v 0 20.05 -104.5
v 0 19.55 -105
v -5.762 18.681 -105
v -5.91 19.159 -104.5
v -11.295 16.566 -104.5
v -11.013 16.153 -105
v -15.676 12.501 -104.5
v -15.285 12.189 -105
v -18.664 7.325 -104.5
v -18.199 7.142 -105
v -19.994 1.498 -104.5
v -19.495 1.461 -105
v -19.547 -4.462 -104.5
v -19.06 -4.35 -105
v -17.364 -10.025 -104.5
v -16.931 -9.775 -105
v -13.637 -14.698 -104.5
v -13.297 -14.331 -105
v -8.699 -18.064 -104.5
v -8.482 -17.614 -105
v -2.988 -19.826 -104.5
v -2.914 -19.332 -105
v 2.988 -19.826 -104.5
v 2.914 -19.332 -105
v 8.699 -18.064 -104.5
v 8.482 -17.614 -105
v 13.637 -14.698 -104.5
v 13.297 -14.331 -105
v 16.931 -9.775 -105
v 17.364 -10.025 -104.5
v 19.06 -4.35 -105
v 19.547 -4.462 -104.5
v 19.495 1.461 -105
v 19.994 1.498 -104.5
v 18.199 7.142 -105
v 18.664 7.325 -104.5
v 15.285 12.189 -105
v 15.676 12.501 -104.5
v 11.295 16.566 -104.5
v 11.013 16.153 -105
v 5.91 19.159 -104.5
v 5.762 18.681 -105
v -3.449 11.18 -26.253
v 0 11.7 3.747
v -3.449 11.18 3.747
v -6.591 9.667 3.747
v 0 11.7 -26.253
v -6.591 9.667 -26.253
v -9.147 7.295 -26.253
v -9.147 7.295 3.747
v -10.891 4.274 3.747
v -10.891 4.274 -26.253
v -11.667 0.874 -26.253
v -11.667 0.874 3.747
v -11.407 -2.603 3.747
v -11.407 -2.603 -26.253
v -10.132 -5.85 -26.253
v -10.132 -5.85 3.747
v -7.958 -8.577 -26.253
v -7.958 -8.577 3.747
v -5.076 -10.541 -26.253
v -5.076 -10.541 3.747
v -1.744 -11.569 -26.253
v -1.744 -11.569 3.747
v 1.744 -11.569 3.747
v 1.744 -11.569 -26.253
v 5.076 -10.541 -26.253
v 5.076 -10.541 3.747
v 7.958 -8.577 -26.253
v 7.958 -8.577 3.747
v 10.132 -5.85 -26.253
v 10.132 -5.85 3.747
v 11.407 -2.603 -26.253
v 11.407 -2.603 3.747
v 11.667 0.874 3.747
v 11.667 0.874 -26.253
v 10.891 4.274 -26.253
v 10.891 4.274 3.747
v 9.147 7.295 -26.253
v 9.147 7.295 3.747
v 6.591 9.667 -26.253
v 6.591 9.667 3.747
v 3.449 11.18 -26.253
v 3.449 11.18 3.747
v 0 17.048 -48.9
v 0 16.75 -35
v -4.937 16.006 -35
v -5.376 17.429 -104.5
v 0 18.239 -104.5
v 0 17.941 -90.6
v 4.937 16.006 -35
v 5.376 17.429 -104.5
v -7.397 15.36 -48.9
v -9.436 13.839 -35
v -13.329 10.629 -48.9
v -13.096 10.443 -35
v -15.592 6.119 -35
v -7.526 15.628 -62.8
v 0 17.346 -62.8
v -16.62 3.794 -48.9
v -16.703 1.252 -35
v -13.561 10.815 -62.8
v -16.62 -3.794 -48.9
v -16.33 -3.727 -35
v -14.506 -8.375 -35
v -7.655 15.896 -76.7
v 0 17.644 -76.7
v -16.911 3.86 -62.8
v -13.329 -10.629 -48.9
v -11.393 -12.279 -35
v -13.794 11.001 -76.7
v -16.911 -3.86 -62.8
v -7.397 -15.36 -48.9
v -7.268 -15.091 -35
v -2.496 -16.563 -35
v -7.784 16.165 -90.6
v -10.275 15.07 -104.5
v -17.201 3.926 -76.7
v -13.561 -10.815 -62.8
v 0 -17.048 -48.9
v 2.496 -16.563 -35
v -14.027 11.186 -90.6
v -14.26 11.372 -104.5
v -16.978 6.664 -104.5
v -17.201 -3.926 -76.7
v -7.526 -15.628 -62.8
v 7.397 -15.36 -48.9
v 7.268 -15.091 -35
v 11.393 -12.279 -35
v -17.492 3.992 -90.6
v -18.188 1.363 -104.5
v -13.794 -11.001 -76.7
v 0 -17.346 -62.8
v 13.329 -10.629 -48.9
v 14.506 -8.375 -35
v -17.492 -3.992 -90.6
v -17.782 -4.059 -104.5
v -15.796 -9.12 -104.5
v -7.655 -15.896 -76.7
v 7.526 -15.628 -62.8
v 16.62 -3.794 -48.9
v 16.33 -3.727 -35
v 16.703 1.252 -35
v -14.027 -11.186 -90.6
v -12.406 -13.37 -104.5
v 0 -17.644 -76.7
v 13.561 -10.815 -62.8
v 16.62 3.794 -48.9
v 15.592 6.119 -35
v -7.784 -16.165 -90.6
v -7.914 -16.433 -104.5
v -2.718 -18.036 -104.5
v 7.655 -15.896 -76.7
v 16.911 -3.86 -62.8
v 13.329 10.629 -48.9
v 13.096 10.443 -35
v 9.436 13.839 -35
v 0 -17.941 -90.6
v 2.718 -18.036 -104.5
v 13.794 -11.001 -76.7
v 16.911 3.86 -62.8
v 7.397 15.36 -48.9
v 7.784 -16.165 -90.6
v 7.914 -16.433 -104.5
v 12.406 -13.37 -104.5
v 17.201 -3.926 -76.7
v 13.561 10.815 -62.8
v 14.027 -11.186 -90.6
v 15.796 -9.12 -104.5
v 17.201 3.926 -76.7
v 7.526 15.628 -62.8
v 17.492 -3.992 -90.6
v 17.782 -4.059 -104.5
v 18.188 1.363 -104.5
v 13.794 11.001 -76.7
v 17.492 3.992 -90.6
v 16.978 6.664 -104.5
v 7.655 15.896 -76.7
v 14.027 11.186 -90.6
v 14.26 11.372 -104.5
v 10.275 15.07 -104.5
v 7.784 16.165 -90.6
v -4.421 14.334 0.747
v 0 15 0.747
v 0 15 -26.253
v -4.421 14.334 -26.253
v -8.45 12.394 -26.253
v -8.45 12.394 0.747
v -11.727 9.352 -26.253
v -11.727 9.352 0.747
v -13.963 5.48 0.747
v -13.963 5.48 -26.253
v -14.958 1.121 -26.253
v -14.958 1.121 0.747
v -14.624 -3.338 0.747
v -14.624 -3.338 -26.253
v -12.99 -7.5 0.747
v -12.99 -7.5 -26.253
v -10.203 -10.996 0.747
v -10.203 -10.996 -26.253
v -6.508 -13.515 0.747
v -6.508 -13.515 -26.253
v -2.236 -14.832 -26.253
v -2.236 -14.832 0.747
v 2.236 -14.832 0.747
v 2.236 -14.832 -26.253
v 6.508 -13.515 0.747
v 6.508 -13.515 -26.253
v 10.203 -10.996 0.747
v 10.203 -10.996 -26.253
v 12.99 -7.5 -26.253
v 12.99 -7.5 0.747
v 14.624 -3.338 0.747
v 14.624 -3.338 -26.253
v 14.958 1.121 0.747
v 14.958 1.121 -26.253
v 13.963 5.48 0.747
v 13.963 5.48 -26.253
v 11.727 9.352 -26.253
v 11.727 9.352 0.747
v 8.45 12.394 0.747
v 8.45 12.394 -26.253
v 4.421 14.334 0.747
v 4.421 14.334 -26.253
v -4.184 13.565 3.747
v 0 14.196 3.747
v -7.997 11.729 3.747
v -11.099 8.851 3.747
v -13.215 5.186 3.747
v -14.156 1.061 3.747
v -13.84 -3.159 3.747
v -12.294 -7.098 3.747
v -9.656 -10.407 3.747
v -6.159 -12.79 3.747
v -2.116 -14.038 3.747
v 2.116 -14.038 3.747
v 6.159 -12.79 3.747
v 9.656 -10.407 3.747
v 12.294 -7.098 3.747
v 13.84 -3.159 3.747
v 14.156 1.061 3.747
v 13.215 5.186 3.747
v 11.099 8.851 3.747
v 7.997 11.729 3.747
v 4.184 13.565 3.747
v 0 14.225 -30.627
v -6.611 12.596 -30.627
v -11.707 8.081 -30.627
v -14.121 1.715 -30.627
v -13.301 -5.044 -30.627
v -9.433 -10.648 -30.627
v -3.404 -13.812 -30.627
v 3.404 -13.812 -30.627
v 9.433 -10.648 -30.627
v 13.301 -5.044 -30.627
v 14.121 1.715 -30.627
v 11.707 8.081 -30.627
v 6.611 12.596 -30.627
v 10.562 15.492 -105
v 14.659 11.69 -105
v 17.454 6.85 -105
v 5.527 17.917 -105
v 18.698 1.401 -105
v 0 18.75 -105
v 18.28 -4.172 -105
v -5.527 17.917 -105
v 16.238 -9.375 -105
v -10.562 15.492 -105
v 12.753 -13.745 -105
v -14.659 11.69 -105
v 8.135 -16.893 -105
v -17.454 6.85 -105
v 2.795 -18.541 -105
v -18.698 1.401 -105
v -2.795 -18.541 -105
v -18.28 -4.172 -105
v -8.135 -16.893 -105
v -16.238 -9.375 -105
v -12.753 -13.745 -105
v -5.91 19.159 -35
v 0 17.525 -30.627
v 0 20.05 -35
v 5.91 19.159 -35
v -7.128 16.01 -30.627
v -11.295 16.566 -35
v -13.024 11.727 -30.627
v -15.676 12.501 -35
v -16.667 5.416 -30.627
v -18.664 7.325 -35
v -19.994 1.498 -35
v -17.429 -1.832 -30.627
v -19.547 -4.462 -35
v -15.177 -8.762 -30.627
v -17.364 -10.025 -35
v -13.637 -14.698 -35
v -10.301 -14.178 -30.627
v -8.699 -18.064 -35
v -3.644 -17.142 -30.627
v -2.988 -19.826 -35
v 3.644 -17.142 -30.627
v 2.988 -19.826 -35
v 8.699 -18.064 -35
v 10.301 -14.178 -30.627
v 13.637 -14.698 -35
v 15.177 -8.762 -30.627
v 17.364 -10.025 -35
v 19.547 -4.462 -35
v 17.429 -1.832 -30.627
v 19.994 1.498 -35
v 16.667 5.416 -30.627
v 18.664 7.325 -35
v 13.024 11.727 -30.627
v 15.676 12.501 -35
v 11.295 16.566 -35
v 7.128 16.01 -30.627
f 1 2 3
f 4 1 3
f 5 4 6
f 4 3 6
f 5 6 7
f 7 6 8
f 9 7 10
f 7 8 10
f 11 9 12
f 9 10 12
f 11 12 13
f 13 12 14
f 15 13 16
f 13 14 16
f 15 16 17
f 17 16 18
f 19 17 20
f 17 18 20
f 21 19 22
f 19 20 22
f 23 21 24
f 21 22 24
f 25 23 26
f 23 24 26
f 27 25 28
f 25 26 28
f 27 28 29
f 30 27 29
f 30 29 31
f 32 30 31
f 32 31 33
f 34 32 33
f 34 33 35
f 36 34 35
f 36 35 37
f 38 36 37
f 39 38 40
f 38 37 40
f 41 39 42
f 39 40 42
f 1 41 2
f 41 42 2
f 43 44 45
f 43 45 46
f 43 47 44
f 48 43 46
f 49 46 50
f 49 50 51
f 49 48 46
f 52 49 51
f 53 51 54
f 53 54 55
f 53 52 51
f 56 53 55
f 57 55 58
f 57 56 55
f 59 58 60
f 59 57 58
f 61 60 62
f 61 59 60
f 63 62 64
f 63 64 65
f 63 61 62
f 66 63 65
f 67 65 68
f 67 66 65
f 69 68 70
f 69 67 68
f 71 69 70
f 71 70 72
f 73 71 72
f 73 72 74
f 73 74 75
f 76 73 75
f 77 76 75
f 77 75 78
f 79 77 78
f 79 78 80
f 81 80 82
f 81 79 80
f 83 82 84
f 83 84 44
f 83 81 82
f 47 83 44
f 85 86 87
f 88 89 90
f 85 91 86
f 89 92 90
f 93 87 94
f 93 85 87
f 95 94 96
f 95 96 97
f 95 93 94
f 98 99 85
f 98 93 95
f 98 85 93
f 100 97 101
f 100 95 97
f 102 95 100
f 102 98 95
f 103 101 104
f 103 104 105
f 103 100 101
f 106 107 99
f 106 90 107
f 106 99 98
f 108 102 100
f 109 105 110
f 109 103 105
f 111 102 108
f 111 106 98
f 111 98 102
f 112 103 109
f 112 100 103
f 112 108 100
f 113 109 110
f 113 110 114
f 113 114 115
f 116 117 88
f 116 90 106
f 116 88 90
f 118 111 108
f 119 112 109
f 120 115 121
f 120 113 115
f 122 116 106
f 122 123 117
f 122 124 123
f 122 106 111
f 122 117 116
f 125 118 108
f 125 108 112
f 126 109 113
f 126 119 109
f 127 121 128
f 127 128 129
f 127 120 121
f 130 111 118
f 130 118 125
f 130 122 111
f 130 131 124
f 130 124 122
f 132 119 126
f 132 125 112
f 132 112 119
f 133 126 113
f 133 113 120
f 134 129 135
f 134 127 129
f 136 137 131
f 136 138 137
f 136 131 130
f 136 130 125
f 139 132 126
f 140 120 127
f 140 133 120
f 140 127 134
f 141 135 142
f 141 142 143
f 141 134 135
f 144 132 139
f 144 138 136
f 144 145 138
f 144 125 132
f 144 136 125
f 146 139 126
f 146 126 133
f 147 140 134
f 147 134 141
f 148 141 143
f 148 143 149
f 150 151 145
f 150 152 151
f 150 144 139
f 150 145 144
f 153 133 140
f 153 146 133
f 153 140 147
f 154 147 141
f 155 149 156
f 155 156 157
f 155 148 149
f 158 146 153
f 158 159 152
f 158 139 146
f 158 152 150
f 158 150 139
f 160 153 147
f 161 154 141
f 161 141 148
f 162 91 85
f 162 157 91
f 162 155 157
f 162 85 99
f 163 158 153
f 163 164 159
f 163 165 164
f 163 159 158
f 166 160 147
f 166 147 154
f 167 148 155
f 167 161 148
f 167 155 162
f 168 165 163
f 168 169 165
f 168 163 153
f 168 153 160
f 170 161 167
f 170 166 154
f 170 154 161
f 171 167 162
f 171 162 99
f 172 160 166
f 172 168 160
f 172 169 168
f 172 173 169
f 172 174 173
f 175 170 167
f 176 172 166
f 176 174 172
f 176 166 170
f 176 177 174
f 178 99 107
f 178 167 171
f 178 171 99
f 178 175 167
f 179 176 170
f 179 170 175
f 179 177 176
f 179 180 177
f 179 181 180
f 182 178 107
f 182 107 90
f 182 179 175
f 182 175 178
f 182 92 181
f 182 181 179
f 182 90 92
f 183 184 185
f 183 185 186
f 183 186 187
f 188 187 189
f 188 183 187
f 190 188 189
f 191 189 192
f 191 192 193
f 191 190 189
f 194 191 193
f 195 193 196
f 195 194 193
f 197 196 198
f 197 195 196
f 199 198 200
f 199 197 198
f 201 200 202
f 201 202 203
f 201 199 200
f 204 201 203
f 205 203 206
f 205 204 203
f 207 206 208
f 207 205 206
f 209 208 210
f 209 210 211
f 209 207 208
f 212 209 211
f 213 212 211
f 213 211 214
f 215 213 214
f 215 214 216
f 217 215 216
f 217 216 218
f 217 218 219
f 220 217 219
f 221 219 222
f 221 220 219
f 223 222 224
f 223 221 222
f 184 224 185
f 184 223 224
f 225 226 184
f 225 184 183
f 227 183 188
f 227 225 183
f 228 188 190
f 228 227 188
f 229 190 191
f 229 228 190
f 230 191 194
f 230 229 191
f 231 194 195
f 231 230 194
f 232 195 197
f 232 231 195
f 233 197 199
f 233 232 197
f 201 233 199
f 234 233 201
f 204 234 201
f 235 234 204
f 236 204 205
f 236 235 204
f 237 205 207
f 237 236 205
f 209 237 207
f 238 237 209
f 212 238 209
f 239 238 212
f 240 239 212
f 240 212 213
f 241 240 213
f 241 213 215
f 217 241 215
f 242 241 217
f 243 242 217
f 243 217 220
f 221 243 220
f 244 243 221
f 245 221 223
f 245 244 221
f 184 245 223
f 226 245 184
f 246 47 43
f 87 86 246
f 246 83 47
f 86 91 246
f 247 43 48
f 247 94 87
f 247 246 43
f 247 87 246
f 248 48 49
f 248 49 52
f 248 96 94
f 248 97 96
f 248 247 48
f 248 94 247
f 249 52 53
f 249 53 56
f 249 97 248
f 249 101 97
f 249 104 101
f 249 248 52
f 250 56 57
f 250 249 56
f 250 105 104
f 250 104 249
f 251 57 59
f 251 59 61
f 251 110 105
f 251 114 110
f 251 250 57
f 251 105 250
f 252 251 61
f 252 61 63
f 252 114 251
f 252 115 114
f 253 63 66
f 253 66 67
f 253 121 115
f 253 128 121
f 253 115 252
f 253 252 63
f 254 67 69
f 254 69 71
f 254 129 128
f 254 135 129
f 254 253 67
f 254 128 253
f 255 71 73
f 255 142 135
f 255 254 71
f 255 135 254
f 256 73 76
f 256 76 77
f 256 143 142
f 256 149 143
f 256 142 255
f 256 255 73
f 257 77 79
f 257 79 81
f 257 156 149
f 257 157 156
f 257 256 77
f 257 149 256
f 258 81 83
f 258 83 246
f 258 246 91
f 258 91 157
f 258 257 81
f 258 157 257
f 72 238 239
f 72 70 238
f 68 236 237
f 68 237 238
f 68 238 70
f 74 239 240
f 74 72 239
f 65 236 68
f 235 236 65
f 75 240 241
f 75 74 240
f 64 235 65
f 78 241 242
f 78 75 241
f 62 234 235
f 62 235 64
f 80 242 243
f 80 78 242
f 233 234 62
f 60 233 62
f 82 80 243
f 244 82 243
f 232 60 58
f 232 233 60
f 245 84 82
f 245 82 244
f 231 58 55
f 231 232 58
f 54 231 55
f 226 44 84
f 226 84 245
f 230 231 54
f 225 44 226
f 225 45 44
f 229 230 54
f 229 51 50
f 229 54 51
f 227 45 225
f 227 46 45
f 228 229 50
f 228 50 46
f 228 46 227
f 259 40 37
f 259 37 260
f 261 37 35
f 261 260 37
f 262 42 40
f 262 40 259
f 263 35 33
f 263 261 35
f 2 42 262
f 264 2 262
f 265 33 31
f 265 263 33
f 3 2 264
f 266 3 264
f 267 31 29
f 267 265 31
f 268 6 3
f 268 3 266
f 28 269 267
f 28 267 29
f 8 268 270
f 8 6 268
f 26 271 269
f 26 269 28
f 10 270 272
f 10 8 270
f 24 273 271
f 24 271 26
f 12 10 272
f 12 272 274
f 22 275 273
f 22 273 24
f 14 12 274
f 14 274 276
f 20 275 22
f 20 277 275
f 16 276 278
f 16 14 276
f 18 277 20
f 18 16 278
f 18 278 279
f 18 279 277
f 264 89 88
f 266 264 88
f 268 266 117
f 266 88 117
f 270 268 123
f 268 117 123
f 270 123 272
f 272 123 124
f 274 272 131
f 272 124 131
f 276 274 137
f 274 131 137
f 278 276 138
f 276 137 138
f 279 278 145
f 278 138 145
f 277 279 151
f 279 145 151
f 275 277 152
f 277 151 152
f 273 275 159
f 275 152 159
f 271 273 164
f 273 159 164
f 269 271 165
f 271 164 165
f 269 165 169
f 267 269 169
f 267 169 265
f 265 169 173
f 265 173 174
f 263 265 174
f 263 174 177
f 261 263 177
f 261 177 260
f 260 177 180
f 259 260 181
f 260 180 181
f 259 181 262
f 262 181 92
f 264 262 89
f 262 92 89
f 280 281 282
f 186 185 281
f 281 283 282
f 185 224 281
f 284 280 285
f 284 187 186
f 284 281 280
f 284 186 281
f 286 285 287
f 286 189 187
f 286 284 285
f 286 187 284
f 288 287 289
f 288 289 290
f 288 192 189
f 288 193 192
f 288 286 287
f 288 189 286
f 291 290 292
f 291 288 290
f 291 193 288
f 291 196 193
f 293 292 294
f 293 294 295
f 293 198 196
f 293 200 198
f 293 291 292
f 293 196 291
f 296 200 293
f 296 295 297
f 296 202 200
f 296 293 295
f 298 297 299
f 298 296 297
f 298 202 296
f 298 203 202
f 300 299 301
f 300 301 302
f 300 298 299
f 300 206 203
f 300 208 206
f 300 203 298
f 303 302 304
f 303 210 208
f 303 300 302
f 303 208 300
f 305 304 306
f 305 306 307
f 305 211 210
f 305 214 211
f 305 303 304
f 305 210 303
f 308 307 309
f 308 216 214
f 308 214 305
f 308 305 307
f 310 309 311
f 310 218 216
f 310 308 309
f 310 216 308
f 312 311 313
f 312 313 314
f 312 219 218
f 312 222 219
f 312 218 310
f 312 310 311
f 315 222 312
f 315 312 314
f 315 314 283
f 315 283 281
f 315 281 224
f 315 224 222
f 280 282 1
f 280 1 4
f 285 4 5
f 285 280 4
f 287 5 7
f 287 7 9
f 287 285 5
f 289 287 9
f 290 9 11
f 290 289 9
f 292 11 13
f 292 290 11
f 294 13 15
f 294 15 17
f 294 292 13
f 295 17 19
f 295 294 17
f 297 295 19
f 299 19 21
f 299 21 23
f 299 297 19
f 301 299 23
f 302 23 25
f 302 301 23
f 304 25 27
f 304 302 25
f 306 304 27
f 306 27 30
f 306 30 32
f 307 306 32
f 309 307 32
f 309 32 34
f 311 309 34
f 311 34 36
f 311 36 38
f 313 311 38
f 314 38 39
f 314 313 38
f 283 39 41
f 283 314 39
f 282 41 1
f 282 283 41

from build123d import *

# Parameters (mm, degrees)
CHAMFER_ANGLE   = 15
CHAMFER_SIZE    = 3
CHAMFER001_SIZE = 0.5


with BuildPart() as part:
    # Sketch010 → Revolution (revolve)
    with BuildSketch(Plane.YZ):
        Polygon((18.25, -70), (20.05, -70), (20.05, 0), (15, 8.746857), (15, 38.746857), (11.7, 38.746857), (11.7, 8.746857), (16.75, 0), align=None)
    revolve(axis=Axis((0, 0, 0), (0, 0, 1)))

    # Chamfer
    chamfer_edges = [part.edges().sort_by_distance(p)[0] for p in [
        (0, -15, 38.746857),
    ]]
    chamfer_side = part.faces().sort_by_distance((0, -15, 23.746857))[0]
    chamfer(chamfer_edges, length=CHAMFER_SIZE, angle=CHAMFER_ANGLE, reference=chamfer_side)

    # Chamfer001
    chamfer001_edges = [part.edges().sort_by_distance(p)[0] for p in [
        (0, -18.25, -70),
        (0, -20.05, -70),
    ]]
    chamfer(chamfer001_edges, length=CHAMFER001_SIZE)


with BuildPart() as part_1:
    # Body002 placement: moved
    add(part.part.moved(Location((0, 0, -35))))


solid = part_1.part
